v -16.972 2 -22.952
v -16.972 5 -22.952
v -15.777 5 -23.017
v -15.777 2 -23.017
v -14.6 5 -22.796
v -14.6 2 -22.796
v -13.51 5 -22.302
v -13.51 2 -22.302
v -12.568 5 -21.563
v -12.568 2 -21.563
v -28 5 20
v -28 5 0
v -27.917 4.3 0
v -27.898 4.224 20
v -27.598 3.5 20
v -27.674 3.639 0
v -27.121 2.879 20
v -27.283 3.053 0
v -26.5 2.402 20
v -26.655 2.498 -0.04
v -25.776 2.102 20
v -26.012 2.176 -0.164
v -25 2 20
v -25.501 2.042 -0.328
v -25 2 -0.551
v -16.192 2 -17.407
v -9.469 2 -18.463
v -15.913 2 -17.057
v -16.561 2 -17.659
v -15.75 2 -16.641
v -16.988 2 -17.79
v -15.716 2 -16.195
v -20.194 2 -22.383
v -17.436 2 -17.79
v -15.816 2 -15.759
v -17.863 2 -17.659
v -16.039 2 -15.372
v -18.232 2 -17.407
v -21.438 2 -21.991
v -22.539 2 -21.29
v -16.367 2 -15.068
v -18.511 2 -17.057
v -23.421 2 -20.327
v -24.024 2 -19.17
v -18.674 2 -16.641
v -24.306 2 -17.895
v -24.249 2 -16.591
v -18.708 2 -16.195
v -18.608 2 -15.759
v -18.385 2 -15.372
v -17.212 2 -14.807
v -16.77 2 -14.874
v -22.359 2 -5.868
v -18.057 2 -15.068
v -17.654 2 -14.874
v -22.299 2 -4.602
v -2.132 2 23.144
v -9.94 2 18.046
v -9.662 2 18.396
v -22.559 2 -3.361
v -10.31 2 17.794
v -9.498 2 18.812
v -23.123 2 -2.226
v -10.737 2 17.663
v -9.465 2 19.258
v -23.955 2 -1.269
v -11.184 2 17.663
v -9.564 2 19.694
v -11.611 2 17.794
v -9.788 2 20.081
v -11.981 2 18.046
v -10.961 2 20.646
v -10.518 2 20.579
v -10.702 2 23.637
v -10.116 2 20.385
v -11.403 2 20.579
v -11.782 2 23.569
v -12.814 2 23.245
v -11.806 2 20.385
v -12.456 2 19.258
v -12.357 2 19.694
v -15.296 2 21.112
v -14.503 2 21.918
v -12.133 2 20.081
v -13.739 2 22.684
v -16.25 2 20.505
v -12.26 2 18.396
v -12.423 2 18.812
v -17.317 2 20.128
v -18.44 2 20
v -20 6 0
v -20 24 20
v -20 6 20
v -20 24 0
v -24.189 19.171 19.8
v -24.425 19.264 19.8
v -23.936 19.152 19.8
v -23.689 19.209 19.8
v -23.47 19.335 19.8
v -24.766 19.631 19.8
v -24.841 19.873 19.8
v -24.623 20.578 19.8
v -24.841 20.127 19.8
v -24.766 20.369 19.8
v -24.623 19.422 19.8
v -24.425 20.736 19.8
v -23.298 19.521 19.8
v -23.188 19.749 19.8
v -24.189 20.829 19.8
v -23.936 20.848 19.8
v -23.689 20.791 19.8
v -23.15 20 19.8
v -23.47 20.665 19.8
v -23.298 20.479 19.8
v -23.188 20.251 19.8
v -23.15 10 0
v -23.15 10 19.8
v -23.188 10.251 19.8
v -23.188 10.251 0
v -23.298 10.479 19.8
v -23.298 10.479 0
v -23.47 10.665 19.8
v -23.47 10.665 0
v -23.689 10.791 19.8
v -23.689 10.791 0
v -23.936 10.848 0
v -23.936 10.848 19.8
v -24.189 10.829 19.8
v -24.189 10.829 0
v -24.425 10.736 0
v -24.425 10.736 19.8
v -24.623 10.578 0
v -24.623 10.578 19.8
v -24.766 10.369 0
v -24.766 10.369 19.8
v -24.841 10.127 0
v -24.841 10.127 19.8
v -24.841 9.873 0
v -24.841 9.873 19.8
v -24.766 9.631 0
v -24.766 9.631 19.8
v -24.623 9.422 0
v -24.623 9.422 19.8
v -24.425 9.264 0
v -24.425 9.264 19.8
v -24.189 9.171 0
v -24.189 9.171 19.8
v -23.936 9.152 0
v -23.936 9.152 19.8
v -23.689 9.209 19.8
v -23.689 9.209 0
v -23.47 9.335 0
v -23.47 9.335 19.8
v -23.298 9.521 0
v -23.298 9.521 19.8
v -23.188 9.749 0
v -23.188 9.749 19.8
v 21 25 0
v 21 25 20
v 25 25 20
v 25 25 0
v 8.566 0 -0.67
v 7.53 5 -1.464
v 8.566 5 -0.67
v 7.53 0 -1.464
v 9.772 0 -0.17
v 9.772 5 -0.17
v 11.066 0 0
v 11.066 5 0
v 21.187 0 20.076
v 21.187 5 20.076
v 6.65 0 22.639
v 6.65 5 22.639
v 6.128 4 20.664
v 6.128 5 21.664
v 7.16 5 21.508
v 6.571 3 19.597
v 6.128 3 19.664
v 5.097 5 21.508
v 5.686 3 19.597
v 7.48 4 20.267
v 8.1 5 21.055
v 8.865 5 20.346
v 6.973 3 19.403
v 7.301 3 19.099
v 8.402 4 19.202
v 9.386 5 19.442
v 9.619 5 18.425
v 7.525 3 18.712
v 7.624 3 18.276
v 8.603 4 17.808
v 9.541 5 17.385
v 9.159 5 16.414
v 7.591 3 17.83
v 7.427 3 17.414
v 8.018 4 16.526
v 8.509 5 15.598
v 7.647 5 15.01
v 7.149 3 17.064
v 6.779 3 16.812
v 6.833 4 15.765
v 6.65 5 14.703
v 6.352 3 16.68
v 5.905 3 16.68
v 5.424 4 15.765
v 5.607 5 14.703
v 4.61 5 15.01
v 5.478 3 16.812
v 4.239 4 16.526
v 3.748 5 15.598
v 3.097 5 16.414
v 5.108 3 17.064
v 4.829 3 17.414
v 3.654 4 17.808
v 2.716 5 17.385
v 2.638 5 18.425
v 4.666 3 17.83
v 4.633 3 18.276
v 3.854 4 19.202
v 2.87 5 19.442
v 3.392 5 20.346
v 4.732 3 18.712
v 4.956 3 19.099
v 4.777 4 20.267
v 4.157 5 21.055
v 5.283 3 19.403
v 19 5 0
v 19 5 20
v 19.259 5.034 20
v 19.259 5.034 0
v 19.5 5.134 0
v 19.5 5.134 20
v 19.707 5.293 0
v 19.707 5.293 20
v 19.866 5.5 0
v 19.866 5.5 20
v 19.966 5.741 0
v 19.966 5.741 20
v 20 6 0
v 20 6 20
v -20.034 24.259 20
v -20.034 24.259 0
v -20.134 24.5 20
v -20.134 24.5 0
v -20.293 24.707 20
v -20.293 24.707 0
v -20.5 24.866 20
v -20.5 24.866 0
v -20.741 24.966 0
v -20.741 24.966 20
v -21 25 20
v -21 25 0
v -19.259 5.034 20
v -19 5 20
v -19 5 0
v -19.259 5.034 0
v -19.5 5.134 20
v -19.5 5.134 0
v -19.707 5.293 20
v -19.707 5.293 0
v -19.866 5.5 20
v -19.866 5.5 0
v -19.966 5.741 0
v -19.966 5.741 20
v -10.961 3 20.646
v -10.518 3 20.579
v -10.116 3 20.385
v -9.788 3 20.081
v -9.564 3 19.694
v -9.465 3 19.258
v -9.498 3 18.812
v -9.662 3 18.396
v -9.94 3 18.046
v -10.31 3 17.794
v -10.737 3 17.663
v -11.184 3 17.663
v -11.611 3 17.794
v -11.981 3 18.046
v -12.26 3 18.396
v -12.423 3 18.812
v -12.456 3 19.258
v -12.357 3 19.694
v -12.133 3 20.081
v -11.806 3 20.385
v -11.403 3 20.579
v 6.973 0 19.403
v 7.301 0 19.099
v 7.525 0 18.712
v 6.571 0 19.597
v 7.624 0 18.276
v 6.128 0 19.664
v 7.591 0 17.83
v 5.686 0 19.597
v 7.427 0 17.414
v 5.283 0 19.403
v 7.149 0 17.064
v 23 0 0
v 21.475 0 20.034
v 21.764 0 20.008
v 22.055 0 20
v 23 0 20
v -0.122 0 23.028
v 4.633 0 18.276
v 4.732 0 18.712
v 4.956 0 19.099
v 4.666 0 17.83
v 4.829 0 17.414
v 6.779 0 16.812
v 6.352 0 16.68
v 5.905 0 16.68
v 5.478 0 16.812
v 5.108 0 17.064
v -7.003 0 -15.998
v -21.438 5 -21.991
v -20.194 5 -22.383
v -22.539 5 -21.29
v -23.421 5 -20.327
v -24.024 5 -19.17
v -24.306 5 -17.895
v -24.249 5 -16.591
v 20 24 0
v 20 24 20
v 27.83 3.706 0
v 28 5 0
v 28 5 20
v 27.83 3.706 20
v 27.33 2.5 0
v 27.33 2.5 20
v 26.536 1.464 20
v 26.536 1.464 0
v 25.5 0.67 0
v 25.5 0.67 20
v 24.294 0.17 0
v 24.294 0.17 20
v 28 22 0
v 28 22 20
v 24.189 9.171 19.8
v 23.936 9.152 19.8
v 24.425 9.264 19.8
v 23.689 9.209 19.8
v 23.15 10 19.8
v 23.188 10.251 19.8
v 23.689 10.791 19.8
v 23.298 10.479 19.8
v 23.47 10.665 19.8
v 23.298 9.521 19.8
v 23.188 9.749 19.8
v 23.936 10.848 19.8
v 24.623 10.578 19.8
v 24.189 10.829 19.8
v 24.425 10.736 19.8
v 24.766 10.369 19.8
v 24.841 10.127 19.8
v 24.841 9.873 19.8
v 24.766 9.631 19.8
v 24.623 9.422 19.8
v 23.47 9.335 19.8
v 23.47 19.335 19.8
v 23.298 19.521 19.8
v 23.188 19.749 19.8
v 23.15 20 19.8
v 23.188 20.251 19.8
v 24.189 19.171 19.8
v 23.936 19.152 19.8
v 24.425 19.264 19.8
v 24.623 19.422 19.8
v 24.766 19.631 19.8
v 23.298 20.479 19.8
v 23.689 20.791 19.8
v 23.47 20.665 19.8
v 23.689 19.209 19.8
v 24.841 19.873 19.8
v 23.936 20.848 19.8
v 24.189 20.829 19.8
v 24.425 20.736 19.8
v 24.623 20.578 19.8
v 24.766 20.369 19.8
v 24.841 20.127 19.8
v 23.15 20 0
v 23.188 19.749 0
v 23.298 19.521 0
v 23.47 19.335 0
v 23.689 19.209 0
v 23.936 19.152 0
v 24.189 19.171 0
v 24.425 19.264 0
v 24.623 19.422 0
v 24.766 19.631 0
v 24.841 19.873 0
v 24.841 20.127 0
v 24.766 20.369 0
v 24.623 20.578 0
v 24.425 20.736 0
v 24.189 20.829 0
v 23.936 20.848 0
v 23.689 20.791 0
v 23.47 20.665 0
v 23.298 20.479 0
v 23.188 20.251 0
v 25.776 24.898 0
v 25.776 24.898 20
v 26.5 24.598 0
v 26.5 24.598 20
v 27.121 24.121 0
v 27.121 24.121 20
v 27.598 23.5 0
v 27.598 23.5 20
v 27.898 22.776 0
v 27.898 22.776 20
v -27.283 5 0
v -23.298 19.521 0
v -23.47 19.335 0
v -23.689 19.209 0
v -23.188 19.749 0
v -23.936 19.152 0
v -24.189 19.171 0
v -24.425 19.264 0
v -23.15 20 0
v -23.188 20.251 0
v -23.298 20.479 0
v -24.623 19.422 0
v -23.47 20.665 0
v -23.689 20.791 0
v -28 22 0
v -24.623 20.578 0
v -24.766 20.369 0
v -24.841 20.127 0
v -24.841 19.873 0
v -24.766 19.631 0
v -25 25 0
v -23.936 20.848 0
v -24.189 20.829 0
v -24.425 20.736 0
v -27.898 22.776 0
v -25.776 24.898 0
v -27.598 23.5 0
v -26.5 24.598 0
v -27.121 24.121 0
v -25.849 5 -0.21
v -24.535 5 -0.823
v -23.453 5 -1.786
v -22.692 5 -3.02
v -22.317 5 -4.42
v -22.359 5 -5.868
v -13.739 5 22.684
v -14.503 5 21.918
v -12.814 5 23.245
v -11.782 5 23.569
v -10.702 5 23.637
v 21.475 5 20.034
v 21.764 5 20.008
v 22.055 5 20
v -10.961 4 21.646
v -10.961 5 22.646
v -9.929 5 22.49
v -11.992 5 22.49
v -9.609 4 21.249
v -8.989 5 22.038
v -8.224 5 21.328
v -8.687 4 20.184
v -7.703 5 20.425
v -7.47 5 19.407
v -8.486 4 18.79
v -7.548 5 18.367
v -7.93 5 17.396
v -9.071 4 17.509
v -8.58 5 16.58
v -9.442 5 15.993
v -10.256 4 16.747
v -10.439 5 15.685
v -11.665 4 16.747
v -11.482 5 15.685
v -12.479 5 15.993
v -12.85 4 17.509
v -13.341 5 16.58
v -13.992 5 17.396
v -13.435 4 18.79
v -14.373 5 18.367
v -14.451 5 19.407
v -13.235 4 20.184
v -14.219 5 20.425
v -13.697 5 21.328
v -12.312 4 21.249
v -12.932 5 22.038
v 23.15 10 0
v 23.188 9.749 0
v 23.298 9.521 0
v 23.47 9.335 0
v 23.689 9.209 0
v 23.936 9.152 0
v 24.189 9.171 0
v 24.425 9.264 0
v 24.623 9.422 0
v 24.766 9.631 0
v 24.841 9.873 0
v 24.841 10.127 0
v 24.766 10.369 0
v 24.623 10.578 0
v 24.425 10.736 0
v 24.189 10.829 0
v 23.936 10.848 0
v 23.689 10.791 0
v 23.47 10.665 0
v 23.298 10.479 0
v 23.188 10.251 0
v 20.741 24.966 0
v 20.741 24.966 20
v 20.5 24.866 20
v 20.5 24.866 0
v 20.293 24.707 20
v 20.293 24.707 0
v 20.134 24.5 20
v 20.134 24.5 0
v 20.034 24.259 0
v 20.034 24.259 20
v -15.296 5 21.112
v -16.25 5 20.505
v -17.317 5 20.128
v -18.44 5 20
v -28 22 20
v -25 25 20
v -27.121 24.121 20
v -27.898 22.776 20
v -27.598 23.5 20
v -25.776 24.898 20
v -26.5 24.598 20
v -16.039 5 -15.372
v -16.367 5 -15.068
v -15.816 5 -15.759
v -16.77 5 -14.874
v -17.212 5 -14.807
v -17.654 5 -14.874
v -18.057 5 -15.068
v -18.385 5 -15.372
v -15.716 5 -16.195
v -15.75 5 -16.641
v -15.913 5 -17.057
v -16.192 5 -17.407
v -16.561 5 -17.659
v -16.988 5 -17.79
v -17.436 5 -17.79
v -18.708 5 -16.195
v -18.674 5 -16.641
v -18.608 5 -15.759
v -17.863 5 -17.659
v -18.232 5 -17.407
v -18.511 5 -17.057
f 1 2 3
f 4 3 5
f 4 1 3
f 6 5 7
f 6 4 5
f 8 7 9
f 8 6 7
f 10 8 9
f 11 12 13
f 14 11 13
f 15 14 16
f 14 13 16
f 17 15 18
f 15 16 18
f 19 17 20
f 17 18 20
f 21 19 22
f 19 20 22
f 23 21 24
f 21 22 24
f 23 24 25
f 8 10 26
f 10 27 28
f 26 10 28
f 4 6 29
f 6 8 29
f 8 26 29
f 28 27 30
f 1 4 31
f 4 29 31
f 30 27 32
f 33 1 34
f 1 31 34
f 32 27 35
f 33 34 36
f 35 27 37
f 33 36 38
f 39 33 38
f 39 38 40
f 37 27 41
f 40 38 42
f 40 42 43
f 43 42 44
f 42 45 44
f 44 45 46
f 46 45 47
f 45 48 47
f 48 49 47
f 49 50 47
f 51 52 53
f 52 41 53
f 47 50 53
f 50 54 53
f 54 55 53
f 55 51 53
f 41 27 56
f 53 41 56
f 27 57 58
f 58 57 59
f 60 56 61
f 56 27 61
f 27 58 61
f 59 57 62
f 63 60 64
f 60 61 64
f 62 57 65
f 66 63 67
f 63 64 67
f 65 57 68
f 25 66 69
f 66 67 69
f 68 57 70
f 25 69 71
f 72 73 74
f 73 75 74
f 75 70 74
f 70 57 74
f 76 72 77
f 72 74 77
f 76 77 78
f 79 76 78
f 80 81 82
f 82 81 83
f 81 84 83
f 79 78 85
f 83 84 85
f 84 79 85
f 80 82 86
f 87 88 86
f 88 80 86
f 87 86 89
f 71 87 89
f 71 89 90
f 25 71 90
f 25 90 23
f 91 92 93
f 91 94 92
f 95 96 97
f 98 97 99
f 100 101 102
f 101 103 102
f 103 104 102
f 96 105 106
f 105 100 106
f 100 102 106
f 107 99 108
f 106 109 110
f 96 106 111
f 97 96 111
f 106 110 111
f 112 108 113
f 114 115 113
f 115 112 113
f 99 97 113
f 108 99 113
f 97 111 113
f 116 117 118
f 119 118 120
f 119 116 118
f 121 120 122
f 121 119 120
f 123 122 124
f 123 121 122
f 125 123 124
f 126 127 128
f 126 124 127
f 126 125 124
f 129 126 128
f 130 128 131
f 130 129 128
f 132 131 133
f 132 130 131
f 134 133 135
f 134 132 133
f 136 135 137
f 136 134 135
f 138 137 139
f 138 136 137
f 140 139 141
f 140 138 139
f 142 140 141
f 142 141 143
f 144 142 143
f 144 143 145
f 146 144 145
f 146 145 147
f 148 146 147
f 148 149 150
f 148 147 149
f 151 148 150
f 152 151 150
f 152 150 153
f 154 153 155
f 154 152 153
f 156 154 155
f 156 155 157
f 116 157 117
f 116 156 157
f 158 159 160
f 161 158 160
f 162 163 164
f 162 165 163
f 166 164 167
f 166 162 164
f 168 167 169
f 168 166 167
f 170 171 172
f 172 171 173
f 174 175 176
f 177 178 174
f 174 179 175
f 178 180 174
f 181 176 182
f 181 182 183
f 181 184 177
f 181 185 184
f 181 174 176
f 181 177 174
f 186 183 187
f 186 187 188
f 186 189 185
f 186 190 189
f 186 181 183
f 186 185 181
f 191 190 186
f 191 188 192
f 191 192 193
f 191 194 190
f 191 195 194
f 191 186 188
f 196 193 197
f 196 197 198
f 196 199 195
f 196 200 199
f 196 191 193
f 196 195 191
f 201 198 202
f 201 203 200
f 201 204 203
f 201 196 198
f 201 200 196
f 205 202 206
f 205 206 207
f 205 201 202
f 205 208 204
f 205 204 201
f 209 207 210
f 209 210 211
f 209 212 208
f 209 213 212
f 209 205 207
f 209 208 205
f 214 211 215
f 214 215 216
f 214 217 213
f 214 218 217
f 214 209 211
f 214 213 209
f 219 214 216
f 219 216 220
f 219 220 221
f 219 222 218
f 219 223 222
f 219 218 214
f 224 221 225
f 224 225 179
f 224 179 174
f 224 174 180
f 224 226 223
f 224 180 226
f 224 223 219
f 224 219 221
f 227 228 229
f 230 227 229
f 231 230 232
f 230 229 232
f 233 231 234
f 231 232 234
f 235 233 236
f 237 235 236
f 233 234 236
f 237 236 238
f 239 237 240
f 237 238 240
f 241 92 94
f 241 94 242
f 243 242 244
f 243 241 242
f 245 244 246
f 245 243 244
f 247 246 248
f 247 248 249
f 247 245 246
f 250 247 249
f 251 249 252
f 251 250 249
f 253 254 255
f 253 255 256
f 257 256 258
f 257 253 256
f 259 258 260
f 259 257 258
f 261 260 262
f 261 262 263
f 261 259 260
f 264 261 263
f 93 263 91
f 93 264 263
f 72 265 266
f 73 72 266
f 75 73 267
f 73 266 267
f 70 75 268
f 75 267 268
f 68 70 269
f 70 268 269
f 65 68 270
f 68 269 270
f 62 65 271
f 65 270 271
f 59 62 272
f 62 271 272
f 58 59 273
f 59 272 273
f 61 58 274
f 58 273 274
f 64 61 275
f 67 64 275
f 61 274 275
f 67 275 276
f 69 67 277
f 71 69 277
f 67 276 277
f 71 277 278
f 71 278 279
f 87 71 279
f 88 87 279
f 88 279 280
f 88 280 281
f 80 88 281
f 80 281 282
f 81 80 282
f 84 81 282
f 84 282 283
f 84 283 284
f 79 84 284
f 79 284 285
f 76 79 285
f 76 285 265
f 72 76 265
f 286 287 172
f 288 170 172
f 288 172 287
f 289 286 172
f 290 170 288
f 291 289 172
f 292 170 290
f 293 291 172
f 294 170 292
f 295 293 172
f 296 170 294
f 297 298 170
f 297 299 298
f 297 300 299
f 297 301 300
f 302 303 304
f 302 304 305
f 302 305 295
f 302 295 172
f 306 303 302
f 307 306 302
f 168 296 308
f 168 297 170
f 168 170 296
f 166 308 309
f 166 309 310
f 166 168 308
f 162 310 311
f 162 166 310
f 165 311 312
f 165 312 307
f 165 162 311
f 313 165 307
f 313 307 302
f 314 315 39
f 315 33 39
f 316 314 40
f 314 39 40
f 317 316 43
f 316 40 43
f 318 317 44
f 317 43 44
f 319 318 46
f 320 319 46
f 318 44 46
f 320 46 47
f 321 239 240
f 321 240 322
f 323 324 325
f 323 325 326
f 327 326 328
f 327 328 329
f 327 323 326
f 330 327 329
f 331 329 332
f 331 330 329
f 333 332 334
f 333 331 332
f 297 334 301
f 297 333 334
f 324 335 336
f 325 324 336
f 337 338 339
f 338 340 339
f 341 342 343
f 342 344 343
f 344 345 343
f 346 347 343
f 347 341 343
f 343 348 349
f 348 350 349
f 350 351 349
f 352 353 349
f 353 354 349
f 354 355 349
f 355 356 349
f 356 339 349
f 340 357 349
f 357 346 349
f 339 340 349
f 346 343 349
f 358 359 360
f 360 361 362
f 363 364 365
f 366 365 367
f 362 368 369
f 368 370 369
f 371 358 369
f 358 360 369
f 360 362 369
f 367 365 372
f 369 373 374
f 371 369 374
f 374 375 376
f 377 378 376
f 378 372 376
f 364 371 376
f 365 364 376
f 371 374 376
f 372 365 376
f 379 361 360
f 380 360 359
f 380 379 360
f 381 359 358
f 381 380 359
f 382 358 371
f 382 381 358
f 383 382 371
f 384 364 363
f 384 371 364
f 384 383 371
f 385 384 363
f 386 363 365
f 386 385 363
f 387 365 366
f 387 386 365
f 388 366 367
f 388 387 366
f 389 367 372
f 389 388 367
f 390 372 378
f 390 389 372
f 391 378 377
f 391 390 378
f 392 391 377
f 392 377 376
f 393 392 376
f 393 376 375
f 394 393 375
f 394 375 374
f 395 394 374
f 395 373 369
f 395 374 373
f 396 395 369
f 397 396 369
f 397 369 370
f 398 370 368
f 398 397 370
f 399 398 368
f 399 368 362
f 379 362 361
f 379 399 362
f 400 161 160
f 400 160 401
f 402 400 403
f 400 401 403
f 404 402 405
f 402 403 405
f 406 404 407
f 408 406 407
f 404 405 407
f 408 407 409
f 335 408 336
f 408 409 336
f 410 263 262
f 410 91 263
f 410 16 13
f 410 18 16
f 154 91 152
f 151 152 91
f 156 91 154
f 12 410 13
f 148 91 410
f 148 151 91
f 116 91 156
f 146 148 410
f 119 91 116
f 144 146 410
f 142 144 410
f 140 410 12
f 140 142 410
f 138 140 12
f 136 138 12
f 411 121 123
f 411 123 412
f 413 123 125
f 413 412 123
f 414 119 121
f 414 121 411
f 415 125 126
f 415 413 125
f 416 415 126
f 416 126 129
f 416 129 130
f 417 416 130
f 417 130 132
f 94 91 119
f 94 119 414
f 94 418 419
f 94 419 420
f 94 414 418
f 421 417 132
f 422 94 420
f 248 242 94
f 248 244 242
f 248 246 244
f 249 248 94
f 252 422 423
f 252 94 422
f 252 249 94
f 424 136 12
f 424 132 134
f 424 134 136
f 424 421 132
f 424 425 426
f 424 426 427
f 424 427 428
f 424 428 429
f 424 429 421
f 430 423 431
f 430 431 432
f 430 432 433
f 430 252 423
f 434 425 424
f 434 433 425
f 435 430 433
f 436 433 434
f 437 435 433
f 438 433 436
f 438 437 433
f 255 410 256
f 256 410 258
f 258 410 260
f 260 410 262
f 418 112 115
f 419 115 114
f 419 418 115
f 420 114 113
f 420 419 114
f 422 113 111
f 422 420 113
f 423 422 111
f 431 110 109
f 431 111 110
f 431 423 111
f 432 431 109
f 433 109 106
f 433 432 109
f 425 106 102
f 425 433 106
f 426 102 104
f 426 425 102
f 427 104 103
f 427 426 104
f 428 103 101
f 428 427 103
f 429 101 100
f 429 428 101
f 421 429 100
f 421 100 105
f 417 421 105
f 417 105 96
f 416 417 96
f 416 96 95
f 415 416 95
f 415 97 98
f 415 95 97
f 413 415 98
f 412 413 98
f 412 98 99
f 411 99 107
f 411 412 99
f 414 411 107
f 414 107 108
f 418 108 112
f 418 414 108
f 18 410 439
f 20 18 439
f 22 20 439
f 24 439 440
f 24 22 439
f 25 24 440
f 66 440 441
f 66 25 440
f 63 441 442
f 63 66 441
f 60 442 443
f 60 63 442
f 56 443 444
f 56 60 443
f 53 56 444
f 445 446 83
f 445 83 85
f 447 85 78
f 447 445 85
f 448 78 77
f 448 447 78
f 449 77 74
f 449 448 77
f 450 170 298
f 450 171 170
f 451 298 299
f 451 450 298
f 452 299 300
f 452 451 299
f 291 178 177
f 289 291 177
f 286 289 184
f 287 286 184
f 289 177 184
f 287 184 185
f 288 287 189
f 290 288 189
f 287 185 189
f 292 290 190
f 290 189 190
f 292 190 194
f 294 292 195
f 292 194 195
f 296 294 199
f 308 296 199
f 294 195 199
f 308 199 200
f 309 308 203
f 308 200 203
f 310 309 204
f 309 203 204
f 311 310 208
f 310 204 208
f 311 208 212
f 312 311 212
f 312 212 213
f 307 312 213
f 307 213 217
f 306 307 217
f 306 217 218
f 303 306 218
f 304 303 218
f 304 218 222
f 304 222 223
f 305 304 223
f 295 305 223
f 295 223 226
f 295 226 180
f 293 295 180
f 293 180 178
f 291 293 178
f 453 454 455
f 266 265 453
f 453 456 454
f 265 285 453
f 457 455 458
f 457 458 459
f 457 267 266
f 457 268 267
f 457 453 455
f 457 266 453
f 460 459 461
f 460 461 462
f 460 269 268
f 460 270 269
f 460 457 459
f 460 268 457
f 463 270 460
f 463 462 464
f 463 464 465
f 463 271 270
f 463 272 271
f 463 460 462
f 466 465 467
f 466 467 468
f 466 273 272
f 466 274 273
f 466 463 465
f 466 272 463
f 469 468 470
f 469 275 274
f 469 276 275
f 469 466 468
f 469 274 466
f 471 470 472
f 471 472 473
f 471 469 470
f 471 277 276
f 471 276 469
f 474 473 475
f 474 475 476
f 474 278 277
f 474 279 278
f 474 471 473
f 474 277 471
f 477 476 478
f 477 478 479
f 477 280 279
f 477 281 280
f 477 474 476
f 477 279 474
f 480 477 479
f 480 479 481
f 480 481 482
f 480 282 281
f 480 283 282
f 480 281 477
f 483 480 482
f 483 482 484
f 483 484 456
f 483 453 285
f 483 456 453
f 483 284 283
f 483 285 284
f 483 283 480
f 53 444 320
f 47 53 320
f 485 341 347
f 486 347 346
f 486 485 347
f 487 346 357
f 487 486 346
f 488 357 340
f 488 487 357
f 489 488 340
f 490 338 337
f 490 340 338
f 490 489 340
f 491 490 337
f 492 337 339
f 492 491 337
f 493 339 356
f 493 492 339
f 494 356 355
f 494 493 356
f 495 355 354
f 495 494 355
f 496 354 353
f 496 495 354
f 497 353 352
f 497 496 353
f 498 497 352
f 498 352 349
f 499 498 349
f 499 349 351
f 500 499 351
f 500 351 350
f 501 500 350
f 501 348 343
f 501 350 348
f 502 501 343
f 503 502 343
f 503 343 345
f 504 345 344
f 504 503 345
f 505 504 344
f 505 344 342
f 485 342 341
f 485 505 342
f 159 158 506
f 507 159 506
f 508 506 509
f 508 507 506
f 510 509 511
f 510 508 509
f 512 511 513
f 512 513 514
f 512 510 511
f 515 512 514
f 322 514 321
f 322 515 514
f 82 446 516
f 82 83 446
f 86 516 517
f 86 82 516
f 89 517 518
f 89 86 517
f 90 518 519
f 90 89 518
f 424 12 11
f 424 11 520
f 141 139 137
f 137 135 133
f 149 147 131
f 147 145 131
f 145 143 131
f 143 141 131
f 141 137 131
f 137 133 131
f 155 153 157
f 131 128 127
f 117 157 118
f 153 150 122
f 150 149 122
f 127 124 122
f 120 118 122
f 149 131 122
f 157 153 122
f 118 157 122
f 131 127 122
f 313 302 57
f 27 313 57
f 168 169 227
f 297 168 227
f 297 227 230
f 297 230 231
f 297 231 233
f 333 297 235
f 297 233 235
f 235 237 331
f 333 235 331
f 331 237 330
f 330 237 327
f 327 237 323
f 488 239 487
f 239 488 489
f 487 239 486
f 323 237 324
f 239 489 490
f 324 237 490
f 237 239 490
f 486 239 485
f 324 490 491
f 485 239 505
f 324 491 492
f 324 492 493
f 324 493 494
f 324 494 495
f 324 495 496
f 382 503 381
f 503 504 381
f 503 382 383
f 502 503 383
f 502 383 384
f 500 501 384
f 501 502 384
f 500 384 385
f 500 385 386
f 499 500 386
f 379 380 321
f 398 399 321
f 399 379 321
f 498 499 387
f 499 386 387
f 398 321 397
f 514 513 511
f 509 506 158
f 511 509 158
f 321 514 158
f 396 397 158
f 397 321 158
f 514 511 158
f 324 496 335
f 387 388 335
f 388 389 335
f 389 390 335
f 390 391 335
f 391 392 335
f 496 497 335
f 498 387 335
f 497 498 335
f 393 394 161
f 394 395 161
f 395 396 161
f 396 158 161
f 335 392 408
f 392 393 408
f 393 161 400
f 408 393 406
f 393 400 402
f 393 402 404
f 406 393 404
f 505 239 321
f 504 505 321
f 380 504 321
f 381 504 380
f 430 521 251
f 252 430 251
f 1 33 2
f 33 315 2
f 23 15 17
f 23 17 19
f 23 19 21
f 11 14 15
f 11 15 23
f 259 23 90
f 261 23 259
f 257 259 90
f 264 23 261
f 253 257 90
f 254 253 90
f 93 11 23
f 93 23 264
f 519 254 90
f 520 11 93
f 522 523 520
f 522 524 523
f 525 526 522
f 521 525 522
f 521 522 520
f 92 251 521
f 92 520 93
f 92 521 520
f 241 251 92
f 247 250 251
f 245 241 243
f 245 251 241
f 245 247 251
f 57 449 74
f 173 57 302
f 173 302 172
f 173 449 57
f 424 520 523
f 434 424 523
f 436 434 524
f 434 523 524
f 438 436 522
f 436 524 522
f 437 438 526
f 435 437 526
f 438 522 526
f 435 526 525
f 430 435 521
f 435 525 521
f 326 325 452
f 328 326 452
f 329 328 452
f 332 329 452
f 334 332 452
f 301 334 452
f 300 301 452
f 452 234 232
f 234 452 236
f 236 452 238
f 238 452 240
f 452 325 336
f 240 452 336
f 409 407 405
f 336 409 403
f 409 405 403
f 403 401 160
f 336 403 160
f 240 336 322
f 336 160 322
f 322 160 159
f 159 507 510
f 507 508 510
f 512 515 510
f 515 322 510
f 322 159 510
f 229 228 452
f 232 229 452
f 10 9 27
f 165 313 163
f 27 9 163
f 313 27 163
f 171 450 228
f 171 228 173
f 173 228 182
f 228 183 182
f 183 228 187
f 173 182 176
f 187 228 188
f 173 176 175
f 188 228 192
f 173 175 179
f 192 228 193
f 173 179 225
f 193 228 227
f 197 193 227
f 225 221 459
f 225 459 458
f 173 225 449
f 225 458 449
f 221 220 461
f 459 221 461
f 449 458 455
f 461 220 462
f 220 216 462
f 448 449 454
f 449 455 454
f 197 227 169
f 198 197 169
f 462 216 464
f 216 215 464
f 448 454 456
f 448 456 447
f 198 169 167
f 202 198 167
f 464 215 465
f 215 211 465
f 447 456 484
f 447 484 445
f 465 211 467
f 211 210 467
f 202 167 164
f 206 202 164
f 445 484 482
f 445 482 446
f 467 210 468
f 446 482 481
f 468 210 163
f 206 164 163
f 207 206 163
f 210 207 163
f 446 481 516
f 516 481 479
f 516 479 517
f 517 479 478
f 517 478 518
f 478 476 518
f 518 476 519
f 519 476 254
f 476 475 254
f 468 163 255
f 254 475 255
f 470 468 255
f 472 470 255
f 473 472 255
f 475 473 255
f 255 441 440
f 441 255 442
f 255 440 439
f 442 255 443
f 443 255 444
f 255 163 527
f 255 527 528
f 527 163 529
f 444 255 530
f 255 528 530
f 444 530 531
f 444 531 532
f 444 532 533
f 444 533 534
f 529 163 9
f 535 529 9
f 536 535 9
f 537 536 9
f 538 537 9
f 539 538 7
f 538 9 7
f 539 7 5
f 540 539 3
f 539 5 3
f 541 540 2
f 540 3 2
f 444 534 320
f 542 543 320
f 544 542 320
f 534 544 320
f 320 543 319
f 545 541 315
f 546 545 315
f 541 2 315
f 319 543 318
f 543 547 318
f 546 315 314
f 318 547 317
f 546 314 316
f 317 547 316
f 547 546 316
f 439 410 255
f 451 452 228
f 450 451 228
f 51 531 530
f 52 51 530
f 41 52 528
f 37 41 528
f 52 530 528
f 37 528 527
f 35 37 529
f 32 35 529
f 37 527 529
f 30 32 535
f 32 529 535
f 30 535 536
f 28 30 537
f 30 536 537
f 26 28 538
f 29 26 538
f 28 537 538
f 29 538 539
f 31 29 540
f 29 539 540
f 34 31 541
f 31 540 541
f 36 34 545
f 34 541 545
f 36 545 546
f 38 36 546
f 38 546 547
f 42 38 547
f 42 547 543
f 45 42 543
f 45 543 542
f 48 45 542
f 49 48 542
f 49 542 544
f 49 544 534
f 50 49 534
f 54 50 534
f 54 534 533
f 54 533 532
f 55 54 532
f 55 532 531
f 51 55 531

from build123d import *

# Parameters (mm, degrees)
ESQUISSE1_R             = 0.85
BOSS_EXTRU_1_DEPTH      = 20
BOSS_EXTRU_2_DEPTH      = 5
ESQUISSE3_R             = 1.5
ENL_V_MAT_EXTRU_1_DEPTH = 47.234781527
CONG_1_R                = 1
CONG_2_R                = 3
CHANFREIN2_SIZE         = 2
ENL_V_MAT_EXTRU_2_DEPTH = 2
CHANFREIN3_SIZE         = 2
ENL_V_MAT_EXTRU_3_DEPTH = 47.234781527
CONG_3_R                = 5
CONG_4_R                = 3
BOSS_EXTRU_3_DEPTH      = 0.2


with BuildPart() as part:
    # Esquisse1 → Boss.-Extru.1 (new body)
    with BuildSketch(Plane.XY):
        Polygon((20, 25), (28, 25), (28, 0), (-28, 0), (-28, 25), (-20, 25), (-20, 5), (20, 5), align=None)
        with Locations((-24, 20)):
            Circle(ESQUISSE1_R, mode=Mode.SUBTRACT)
        with Locations((-24, 10)):
            Circle(ESQUISSE1_R, mode=Mode.SUBTRACT)
        with Locations(Location((24, 10, 0), (0, 0, 180))):
            Circle(ESQUISSE1_R, mode=Mode.SUBTRACT)
        with Locations(Location((24, 20, 0), (0, 0, 180))):
            Circle(ESQUISSE1_R, mode=Mode.SUBTRACT)
    extrude(amount=BOSS_EXTRU_1_DEPTH)

    # Esquisse2 → Boss.-Extru.2 (add)
    with BuildSketch(Plane(origin=(0, 5, 0), x_dir=(1, 0, 0), z_dir=(0, 1, 0))):
        Polygon((-25.117673753, 21.515226358), (28, 30.881305394), (28, -18.874598589), (-16.608913047, -26.740353539), align=None)
    extrude(amount=-BOSS_EXTRU_2_DEPTH)

    # Esquisse3 → Enlèv. mat.-Extru.1 (cut, through all)
    with BuildSketch(Plane(origin=(0, 5, 0), x_dir=(1, 0, 0), z_dir=(0, 1, 0))):
        with Locations(Location((-17.211954407, 16.307159752, 0), (0, 0, 270))):
            Circle(ESQUISSE3_R)
        with Locations(Location((6.128408145, -18.163515842, 0), (0, 0, 270))):
            Circle(ESQUISSE3_R)
        with Locations(Location((-10.960620011, -19.145919356, 0), (0, 0, 270))):
            Circle(ESQUISSE3_R)
    extrude(amount=-ENL_V_MAT_EXTRU_1_DEPTH, mode=Mode.SUBTRACT)

    # Congé1
    cong_1_edges = [part.edges().sort_by_distance(p)[0] for p in [
        (-20, 25, 10),
        (-20, 5, 10),
        (20, 5, 10),
        (20, 25, 10),
    ]]
    fillet(cong_1_edges, radius=CONG_1_R)

    # Congé2
    cong_2_edges = [part.edges().sort_by_distance(p)[0] for p in [
        (-28, 25, 10),
        (28, 25, 10),
    ]]
    fillet(cong_2_edges, radius=CONG_2_R)

    # Chanfrein2
    chanfrein2_edges = [part.edges().sort_by_distance(p)[0] for p in [
        (-10.960620011, 5, 17.645919356),
        (6.128408145, 5, 16.663515842),
    ]]
    chamfer(chanfrein2_edges, length=CHANFREIN2_SIZE)

    # Esquisse4 → Enlèv. mat.-Extru.2 (cut)
    with BuildSketch(Plane.XZ):
        Polygon((-48.23971452, 32.31771726), (0.015865378, 23.808956555), (-8.492895328, -24.446623343), (-56.748475225, -15.937862637), align=None)
    extrude(amount=-ENL_V_MAT_EXTRU_2_DEPTH, mode=Mode.SUBTRACT)

    # Chanfrein3
    chanfrein3_edges = [part.edges().sort_by_distance(p)[0] for p in [
        (-4.238514975, 2, -0.318833394),
    ]]
    chamfer(chanfrein3_edges, length=CHANFREIN3_SIZE - 0.0001)  # a hair under: the kernel refuses the full size

    # Esquisse5 → Enlèv. mat.-Extru.3 (cut, through all)
    with BuildSketch(Plane(origin=(0, 5, 0), x_dir=(1, 0, 0), z_dir=(0, 1, 0))):
        with BuildLine():
            Line((-28, -20), (-15.377035546, -20))
            ThreePointArc((-15.377035546, -20), (-13.722728197, -22.696262762), (-10.702454097, -23.636746706))
            Line((-10.702454097, -23.636746706), (6.649832575, -22.639209149))
            Line((6.649832575, -22.639209149), (6.649832575, -26.740353539))
            Line((6.649832575, -26.740353539), (-28, -26.740353539))
            Line((-28, -26.740353539), (-28, -20))
        make_face()
        Polygon((28, 30.881305394), (-21.886605112, 30.881305394), (8.994700282, 0), (28, 0), align=None)
    extrude(amount=-ENL_V_MAT_EXTRU_3_DEPTH, mode=Mode.SUBTRACT)

    # Congé3
    cong_3_edges = [part.edges().sort_by_distance(p)[0] for p in [
        (28, 0, 10),
        (-25.117673753, 3.5, -21.515226358),
        (-15.377035546, 3.5, 20),
        (-14.408791034, 3.5, -23.403491315),
        (8.994700282, 2.5, 0),
        (-21.32395885, 3.5, 0),
        (21.617531437, 2.5, 20),
    ]]
    fillet(cong_3_edges, radius=CONG_3_R)

    # Congé4
    cong_4_edges = [part.edges().sort_by_distance(p)[0] for p in [
        (-28, 2, 10),
    ]]
    fillet(cong_4_edges, radius=CONG_4_R)

    # Esquisse6 → Boss.-Extru.3 (add)
    with BuildSketch(Plane.XY.offset(20)):
        with BuildLine():
            Line((-28, 22), (-28, 5))
            ThreePointArc((-28, 5), (-27.121320344, 2.878679656), (-25, 2))
            Line((-25, 2), (-18.440348512, 2))
            Line((-18.440348512, 2), (-18.440348512, 5))
            Line((-18.440348512, 5), (-19, 5))
            ThreePointArc((-19, 5), (-19.707106781, 5.292893219), (-20, 6))
            Line((-20, 6), (-20, 24))
            ThreePointArc((-20, 24), (-20.292893219, 24.707106781), (-21, 25))
            Line((-21, 25), (-25, 25))
            ThreePointArc((-25, 25), (-27.121320344, 24.121320344), (-28, 22))
        make_face()
        with BuildLine():
            Line((19, 5), (22.054974755, 5))
            Line((22.054974755, 5), (22.054974755, 0))
            Line((22.054974755, 0), (23, 0))
            ThreePointArc((23, 0), (26.535533906, 1.464466094), (28, 5))
            Line((28, 5), (28, 22))
            ThreePointArc((28, 22), (27.121320344, 24.121320344), (25, 25))
            Line((25, 25), (21, 25))
            ThreePointArc((21, 25), (20.292893219, 24.707106781), (20, 24))
            Line((20, 24), (20, 6))
            ThreePointArc((20, 6), (19.707106781, 5.292893219), (19, 5))
        make_face()
    extrude(amount=-BOSS_EXTRU_3_DEPTH)


solid = part.part
